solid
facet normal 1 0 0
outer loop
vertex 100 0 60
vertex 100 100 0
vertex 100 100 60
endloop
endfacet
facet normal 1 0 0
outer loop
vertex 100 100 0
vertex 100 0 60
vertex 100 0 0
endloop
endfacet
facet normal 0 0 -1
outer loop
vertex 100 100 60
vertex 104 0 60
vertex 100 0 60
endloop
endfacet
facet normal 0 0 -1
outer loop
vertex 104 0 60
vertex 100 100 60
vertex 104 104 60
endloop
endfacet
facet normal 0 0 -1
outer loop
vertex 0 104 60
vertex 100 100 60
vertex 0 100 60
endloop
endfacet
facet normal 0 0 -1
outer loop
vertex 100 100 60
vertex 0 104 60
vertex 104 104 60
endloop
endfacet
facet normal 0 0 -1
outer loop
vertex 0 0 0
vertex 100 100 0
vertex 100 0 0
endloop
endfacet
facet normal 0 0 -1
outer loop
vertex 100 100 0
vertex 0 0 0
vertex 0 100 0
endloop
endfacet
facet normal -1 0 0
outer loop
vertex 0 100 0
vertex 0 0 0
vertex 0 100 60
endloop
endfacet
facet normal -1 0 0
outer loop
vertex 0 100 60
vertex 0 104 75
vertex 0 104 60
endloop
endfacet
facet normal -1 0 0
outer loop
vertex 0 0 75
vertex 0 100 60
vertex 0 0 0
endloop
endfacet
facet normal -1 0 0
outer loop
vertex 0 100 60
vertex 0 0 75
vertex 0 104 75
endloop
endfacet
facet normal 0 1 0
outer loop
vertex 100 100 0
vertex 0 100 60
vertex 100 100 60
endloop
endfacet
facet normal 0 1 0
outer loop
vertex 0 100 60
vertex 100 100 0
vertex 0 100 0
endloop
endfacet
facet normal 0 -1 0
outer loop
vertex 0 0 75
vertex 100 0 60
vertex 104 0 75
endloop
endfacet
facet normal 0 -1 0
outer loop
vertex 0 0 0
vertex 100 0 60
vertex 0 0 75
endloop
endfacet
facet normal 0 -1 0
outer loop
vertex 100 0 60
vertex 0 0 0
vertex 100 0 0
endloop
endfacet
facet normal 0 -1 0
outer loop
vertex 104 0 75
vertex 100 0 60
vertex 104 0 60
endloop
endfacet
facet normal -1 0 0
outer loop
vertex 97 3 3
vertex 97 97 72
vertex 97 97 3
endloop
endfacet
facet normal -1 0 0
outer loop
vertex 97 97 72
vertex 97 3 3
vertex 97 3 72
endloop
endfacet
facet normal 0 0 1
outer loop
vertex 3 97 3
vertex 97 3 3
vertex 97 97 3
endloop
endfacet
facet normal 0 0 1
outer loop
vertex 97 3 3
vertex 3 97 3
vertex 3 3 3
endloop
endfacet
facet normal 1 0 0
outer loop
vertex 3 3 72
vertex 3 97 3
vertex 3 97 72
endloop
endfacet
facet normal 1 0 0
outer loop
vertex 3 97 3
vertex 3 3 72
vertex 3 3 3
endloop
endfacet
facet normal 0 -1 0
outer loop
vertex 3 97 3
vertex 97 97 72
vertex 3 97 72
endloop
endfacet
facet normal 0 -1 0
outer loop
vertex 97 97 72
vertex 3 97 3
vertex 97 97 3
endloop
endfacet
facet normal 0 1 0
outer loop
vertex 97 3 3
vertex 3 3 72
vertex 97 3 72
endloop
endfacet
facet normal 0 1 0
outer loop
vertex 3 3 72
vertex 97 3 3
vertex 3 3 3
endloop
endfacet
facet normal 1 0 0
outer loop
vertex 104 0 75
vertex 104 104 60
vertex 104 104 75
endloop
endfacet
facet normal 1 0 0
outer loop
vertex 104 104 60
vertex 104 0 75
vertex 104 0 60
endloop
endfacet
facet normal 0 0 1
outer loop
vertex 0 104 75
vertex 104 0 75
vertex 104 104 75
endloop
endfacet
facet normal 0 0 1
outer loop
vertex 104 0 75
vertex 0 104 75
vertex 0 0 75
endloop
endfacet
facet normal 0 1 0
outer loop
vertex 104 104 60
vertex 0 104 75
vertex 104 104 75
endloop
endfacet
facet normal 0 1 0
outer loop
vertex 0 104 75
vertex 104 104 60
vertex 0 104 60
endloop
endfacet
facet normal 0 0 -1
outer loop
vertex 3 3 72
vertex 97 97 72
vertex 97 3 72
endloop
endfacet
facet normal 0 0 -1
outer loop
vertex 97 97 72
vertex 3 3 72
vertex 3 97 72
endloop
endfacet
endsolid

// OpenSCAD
// Box parameters
box_length = 100;       // [50:1:200]    Box length (X direction)
box_width = 100;        // [50:1:200]    Box width (Y direction)
box_height = 60;        // [30:1:150]    Box height (Z direction)
wall_thickness = 3;     // [1:1:10]      Wall thickness
lid_height = 15;        // [5:1:30]      Height of the lid
lid_overlap = 2;          // [0:0.5:5]    How much the lid overlaps the box edges
box_color = "SaddleBrown";
lid_color = "DarkSlateGray";

module box_body() {
    difference() {
        cube([box_length, box_width, box_height]);
        translate([wall_thickness, wall_thickness, wall_thickness])
        cube([box_length - 2*wall_thickness, box_width - 2*wall_thickness, box_height]);
    }
}

module lid() {
    difference() {
        translate([0, 0, box_height])
        cube([box_length + 2*lid_overlap, box_width + 2*lid_overlap, lid_height]);
        translate([wall_thickness, wall_thickness, box_height - wall_thickness])
        cube([box_length - 2*wall_thickness, box_width - 2*wall_thickness, lid_height]);
    }
}

module lid_standoff() {
    translate([0, 0, box_height + lid_height - wall_thickness])
    cube([box_length + 2*lid_overlap, box_width + 2*lid_overlap, wall_thickness]);
}

color(box_color) box_body();
color(lid_color) lid();
